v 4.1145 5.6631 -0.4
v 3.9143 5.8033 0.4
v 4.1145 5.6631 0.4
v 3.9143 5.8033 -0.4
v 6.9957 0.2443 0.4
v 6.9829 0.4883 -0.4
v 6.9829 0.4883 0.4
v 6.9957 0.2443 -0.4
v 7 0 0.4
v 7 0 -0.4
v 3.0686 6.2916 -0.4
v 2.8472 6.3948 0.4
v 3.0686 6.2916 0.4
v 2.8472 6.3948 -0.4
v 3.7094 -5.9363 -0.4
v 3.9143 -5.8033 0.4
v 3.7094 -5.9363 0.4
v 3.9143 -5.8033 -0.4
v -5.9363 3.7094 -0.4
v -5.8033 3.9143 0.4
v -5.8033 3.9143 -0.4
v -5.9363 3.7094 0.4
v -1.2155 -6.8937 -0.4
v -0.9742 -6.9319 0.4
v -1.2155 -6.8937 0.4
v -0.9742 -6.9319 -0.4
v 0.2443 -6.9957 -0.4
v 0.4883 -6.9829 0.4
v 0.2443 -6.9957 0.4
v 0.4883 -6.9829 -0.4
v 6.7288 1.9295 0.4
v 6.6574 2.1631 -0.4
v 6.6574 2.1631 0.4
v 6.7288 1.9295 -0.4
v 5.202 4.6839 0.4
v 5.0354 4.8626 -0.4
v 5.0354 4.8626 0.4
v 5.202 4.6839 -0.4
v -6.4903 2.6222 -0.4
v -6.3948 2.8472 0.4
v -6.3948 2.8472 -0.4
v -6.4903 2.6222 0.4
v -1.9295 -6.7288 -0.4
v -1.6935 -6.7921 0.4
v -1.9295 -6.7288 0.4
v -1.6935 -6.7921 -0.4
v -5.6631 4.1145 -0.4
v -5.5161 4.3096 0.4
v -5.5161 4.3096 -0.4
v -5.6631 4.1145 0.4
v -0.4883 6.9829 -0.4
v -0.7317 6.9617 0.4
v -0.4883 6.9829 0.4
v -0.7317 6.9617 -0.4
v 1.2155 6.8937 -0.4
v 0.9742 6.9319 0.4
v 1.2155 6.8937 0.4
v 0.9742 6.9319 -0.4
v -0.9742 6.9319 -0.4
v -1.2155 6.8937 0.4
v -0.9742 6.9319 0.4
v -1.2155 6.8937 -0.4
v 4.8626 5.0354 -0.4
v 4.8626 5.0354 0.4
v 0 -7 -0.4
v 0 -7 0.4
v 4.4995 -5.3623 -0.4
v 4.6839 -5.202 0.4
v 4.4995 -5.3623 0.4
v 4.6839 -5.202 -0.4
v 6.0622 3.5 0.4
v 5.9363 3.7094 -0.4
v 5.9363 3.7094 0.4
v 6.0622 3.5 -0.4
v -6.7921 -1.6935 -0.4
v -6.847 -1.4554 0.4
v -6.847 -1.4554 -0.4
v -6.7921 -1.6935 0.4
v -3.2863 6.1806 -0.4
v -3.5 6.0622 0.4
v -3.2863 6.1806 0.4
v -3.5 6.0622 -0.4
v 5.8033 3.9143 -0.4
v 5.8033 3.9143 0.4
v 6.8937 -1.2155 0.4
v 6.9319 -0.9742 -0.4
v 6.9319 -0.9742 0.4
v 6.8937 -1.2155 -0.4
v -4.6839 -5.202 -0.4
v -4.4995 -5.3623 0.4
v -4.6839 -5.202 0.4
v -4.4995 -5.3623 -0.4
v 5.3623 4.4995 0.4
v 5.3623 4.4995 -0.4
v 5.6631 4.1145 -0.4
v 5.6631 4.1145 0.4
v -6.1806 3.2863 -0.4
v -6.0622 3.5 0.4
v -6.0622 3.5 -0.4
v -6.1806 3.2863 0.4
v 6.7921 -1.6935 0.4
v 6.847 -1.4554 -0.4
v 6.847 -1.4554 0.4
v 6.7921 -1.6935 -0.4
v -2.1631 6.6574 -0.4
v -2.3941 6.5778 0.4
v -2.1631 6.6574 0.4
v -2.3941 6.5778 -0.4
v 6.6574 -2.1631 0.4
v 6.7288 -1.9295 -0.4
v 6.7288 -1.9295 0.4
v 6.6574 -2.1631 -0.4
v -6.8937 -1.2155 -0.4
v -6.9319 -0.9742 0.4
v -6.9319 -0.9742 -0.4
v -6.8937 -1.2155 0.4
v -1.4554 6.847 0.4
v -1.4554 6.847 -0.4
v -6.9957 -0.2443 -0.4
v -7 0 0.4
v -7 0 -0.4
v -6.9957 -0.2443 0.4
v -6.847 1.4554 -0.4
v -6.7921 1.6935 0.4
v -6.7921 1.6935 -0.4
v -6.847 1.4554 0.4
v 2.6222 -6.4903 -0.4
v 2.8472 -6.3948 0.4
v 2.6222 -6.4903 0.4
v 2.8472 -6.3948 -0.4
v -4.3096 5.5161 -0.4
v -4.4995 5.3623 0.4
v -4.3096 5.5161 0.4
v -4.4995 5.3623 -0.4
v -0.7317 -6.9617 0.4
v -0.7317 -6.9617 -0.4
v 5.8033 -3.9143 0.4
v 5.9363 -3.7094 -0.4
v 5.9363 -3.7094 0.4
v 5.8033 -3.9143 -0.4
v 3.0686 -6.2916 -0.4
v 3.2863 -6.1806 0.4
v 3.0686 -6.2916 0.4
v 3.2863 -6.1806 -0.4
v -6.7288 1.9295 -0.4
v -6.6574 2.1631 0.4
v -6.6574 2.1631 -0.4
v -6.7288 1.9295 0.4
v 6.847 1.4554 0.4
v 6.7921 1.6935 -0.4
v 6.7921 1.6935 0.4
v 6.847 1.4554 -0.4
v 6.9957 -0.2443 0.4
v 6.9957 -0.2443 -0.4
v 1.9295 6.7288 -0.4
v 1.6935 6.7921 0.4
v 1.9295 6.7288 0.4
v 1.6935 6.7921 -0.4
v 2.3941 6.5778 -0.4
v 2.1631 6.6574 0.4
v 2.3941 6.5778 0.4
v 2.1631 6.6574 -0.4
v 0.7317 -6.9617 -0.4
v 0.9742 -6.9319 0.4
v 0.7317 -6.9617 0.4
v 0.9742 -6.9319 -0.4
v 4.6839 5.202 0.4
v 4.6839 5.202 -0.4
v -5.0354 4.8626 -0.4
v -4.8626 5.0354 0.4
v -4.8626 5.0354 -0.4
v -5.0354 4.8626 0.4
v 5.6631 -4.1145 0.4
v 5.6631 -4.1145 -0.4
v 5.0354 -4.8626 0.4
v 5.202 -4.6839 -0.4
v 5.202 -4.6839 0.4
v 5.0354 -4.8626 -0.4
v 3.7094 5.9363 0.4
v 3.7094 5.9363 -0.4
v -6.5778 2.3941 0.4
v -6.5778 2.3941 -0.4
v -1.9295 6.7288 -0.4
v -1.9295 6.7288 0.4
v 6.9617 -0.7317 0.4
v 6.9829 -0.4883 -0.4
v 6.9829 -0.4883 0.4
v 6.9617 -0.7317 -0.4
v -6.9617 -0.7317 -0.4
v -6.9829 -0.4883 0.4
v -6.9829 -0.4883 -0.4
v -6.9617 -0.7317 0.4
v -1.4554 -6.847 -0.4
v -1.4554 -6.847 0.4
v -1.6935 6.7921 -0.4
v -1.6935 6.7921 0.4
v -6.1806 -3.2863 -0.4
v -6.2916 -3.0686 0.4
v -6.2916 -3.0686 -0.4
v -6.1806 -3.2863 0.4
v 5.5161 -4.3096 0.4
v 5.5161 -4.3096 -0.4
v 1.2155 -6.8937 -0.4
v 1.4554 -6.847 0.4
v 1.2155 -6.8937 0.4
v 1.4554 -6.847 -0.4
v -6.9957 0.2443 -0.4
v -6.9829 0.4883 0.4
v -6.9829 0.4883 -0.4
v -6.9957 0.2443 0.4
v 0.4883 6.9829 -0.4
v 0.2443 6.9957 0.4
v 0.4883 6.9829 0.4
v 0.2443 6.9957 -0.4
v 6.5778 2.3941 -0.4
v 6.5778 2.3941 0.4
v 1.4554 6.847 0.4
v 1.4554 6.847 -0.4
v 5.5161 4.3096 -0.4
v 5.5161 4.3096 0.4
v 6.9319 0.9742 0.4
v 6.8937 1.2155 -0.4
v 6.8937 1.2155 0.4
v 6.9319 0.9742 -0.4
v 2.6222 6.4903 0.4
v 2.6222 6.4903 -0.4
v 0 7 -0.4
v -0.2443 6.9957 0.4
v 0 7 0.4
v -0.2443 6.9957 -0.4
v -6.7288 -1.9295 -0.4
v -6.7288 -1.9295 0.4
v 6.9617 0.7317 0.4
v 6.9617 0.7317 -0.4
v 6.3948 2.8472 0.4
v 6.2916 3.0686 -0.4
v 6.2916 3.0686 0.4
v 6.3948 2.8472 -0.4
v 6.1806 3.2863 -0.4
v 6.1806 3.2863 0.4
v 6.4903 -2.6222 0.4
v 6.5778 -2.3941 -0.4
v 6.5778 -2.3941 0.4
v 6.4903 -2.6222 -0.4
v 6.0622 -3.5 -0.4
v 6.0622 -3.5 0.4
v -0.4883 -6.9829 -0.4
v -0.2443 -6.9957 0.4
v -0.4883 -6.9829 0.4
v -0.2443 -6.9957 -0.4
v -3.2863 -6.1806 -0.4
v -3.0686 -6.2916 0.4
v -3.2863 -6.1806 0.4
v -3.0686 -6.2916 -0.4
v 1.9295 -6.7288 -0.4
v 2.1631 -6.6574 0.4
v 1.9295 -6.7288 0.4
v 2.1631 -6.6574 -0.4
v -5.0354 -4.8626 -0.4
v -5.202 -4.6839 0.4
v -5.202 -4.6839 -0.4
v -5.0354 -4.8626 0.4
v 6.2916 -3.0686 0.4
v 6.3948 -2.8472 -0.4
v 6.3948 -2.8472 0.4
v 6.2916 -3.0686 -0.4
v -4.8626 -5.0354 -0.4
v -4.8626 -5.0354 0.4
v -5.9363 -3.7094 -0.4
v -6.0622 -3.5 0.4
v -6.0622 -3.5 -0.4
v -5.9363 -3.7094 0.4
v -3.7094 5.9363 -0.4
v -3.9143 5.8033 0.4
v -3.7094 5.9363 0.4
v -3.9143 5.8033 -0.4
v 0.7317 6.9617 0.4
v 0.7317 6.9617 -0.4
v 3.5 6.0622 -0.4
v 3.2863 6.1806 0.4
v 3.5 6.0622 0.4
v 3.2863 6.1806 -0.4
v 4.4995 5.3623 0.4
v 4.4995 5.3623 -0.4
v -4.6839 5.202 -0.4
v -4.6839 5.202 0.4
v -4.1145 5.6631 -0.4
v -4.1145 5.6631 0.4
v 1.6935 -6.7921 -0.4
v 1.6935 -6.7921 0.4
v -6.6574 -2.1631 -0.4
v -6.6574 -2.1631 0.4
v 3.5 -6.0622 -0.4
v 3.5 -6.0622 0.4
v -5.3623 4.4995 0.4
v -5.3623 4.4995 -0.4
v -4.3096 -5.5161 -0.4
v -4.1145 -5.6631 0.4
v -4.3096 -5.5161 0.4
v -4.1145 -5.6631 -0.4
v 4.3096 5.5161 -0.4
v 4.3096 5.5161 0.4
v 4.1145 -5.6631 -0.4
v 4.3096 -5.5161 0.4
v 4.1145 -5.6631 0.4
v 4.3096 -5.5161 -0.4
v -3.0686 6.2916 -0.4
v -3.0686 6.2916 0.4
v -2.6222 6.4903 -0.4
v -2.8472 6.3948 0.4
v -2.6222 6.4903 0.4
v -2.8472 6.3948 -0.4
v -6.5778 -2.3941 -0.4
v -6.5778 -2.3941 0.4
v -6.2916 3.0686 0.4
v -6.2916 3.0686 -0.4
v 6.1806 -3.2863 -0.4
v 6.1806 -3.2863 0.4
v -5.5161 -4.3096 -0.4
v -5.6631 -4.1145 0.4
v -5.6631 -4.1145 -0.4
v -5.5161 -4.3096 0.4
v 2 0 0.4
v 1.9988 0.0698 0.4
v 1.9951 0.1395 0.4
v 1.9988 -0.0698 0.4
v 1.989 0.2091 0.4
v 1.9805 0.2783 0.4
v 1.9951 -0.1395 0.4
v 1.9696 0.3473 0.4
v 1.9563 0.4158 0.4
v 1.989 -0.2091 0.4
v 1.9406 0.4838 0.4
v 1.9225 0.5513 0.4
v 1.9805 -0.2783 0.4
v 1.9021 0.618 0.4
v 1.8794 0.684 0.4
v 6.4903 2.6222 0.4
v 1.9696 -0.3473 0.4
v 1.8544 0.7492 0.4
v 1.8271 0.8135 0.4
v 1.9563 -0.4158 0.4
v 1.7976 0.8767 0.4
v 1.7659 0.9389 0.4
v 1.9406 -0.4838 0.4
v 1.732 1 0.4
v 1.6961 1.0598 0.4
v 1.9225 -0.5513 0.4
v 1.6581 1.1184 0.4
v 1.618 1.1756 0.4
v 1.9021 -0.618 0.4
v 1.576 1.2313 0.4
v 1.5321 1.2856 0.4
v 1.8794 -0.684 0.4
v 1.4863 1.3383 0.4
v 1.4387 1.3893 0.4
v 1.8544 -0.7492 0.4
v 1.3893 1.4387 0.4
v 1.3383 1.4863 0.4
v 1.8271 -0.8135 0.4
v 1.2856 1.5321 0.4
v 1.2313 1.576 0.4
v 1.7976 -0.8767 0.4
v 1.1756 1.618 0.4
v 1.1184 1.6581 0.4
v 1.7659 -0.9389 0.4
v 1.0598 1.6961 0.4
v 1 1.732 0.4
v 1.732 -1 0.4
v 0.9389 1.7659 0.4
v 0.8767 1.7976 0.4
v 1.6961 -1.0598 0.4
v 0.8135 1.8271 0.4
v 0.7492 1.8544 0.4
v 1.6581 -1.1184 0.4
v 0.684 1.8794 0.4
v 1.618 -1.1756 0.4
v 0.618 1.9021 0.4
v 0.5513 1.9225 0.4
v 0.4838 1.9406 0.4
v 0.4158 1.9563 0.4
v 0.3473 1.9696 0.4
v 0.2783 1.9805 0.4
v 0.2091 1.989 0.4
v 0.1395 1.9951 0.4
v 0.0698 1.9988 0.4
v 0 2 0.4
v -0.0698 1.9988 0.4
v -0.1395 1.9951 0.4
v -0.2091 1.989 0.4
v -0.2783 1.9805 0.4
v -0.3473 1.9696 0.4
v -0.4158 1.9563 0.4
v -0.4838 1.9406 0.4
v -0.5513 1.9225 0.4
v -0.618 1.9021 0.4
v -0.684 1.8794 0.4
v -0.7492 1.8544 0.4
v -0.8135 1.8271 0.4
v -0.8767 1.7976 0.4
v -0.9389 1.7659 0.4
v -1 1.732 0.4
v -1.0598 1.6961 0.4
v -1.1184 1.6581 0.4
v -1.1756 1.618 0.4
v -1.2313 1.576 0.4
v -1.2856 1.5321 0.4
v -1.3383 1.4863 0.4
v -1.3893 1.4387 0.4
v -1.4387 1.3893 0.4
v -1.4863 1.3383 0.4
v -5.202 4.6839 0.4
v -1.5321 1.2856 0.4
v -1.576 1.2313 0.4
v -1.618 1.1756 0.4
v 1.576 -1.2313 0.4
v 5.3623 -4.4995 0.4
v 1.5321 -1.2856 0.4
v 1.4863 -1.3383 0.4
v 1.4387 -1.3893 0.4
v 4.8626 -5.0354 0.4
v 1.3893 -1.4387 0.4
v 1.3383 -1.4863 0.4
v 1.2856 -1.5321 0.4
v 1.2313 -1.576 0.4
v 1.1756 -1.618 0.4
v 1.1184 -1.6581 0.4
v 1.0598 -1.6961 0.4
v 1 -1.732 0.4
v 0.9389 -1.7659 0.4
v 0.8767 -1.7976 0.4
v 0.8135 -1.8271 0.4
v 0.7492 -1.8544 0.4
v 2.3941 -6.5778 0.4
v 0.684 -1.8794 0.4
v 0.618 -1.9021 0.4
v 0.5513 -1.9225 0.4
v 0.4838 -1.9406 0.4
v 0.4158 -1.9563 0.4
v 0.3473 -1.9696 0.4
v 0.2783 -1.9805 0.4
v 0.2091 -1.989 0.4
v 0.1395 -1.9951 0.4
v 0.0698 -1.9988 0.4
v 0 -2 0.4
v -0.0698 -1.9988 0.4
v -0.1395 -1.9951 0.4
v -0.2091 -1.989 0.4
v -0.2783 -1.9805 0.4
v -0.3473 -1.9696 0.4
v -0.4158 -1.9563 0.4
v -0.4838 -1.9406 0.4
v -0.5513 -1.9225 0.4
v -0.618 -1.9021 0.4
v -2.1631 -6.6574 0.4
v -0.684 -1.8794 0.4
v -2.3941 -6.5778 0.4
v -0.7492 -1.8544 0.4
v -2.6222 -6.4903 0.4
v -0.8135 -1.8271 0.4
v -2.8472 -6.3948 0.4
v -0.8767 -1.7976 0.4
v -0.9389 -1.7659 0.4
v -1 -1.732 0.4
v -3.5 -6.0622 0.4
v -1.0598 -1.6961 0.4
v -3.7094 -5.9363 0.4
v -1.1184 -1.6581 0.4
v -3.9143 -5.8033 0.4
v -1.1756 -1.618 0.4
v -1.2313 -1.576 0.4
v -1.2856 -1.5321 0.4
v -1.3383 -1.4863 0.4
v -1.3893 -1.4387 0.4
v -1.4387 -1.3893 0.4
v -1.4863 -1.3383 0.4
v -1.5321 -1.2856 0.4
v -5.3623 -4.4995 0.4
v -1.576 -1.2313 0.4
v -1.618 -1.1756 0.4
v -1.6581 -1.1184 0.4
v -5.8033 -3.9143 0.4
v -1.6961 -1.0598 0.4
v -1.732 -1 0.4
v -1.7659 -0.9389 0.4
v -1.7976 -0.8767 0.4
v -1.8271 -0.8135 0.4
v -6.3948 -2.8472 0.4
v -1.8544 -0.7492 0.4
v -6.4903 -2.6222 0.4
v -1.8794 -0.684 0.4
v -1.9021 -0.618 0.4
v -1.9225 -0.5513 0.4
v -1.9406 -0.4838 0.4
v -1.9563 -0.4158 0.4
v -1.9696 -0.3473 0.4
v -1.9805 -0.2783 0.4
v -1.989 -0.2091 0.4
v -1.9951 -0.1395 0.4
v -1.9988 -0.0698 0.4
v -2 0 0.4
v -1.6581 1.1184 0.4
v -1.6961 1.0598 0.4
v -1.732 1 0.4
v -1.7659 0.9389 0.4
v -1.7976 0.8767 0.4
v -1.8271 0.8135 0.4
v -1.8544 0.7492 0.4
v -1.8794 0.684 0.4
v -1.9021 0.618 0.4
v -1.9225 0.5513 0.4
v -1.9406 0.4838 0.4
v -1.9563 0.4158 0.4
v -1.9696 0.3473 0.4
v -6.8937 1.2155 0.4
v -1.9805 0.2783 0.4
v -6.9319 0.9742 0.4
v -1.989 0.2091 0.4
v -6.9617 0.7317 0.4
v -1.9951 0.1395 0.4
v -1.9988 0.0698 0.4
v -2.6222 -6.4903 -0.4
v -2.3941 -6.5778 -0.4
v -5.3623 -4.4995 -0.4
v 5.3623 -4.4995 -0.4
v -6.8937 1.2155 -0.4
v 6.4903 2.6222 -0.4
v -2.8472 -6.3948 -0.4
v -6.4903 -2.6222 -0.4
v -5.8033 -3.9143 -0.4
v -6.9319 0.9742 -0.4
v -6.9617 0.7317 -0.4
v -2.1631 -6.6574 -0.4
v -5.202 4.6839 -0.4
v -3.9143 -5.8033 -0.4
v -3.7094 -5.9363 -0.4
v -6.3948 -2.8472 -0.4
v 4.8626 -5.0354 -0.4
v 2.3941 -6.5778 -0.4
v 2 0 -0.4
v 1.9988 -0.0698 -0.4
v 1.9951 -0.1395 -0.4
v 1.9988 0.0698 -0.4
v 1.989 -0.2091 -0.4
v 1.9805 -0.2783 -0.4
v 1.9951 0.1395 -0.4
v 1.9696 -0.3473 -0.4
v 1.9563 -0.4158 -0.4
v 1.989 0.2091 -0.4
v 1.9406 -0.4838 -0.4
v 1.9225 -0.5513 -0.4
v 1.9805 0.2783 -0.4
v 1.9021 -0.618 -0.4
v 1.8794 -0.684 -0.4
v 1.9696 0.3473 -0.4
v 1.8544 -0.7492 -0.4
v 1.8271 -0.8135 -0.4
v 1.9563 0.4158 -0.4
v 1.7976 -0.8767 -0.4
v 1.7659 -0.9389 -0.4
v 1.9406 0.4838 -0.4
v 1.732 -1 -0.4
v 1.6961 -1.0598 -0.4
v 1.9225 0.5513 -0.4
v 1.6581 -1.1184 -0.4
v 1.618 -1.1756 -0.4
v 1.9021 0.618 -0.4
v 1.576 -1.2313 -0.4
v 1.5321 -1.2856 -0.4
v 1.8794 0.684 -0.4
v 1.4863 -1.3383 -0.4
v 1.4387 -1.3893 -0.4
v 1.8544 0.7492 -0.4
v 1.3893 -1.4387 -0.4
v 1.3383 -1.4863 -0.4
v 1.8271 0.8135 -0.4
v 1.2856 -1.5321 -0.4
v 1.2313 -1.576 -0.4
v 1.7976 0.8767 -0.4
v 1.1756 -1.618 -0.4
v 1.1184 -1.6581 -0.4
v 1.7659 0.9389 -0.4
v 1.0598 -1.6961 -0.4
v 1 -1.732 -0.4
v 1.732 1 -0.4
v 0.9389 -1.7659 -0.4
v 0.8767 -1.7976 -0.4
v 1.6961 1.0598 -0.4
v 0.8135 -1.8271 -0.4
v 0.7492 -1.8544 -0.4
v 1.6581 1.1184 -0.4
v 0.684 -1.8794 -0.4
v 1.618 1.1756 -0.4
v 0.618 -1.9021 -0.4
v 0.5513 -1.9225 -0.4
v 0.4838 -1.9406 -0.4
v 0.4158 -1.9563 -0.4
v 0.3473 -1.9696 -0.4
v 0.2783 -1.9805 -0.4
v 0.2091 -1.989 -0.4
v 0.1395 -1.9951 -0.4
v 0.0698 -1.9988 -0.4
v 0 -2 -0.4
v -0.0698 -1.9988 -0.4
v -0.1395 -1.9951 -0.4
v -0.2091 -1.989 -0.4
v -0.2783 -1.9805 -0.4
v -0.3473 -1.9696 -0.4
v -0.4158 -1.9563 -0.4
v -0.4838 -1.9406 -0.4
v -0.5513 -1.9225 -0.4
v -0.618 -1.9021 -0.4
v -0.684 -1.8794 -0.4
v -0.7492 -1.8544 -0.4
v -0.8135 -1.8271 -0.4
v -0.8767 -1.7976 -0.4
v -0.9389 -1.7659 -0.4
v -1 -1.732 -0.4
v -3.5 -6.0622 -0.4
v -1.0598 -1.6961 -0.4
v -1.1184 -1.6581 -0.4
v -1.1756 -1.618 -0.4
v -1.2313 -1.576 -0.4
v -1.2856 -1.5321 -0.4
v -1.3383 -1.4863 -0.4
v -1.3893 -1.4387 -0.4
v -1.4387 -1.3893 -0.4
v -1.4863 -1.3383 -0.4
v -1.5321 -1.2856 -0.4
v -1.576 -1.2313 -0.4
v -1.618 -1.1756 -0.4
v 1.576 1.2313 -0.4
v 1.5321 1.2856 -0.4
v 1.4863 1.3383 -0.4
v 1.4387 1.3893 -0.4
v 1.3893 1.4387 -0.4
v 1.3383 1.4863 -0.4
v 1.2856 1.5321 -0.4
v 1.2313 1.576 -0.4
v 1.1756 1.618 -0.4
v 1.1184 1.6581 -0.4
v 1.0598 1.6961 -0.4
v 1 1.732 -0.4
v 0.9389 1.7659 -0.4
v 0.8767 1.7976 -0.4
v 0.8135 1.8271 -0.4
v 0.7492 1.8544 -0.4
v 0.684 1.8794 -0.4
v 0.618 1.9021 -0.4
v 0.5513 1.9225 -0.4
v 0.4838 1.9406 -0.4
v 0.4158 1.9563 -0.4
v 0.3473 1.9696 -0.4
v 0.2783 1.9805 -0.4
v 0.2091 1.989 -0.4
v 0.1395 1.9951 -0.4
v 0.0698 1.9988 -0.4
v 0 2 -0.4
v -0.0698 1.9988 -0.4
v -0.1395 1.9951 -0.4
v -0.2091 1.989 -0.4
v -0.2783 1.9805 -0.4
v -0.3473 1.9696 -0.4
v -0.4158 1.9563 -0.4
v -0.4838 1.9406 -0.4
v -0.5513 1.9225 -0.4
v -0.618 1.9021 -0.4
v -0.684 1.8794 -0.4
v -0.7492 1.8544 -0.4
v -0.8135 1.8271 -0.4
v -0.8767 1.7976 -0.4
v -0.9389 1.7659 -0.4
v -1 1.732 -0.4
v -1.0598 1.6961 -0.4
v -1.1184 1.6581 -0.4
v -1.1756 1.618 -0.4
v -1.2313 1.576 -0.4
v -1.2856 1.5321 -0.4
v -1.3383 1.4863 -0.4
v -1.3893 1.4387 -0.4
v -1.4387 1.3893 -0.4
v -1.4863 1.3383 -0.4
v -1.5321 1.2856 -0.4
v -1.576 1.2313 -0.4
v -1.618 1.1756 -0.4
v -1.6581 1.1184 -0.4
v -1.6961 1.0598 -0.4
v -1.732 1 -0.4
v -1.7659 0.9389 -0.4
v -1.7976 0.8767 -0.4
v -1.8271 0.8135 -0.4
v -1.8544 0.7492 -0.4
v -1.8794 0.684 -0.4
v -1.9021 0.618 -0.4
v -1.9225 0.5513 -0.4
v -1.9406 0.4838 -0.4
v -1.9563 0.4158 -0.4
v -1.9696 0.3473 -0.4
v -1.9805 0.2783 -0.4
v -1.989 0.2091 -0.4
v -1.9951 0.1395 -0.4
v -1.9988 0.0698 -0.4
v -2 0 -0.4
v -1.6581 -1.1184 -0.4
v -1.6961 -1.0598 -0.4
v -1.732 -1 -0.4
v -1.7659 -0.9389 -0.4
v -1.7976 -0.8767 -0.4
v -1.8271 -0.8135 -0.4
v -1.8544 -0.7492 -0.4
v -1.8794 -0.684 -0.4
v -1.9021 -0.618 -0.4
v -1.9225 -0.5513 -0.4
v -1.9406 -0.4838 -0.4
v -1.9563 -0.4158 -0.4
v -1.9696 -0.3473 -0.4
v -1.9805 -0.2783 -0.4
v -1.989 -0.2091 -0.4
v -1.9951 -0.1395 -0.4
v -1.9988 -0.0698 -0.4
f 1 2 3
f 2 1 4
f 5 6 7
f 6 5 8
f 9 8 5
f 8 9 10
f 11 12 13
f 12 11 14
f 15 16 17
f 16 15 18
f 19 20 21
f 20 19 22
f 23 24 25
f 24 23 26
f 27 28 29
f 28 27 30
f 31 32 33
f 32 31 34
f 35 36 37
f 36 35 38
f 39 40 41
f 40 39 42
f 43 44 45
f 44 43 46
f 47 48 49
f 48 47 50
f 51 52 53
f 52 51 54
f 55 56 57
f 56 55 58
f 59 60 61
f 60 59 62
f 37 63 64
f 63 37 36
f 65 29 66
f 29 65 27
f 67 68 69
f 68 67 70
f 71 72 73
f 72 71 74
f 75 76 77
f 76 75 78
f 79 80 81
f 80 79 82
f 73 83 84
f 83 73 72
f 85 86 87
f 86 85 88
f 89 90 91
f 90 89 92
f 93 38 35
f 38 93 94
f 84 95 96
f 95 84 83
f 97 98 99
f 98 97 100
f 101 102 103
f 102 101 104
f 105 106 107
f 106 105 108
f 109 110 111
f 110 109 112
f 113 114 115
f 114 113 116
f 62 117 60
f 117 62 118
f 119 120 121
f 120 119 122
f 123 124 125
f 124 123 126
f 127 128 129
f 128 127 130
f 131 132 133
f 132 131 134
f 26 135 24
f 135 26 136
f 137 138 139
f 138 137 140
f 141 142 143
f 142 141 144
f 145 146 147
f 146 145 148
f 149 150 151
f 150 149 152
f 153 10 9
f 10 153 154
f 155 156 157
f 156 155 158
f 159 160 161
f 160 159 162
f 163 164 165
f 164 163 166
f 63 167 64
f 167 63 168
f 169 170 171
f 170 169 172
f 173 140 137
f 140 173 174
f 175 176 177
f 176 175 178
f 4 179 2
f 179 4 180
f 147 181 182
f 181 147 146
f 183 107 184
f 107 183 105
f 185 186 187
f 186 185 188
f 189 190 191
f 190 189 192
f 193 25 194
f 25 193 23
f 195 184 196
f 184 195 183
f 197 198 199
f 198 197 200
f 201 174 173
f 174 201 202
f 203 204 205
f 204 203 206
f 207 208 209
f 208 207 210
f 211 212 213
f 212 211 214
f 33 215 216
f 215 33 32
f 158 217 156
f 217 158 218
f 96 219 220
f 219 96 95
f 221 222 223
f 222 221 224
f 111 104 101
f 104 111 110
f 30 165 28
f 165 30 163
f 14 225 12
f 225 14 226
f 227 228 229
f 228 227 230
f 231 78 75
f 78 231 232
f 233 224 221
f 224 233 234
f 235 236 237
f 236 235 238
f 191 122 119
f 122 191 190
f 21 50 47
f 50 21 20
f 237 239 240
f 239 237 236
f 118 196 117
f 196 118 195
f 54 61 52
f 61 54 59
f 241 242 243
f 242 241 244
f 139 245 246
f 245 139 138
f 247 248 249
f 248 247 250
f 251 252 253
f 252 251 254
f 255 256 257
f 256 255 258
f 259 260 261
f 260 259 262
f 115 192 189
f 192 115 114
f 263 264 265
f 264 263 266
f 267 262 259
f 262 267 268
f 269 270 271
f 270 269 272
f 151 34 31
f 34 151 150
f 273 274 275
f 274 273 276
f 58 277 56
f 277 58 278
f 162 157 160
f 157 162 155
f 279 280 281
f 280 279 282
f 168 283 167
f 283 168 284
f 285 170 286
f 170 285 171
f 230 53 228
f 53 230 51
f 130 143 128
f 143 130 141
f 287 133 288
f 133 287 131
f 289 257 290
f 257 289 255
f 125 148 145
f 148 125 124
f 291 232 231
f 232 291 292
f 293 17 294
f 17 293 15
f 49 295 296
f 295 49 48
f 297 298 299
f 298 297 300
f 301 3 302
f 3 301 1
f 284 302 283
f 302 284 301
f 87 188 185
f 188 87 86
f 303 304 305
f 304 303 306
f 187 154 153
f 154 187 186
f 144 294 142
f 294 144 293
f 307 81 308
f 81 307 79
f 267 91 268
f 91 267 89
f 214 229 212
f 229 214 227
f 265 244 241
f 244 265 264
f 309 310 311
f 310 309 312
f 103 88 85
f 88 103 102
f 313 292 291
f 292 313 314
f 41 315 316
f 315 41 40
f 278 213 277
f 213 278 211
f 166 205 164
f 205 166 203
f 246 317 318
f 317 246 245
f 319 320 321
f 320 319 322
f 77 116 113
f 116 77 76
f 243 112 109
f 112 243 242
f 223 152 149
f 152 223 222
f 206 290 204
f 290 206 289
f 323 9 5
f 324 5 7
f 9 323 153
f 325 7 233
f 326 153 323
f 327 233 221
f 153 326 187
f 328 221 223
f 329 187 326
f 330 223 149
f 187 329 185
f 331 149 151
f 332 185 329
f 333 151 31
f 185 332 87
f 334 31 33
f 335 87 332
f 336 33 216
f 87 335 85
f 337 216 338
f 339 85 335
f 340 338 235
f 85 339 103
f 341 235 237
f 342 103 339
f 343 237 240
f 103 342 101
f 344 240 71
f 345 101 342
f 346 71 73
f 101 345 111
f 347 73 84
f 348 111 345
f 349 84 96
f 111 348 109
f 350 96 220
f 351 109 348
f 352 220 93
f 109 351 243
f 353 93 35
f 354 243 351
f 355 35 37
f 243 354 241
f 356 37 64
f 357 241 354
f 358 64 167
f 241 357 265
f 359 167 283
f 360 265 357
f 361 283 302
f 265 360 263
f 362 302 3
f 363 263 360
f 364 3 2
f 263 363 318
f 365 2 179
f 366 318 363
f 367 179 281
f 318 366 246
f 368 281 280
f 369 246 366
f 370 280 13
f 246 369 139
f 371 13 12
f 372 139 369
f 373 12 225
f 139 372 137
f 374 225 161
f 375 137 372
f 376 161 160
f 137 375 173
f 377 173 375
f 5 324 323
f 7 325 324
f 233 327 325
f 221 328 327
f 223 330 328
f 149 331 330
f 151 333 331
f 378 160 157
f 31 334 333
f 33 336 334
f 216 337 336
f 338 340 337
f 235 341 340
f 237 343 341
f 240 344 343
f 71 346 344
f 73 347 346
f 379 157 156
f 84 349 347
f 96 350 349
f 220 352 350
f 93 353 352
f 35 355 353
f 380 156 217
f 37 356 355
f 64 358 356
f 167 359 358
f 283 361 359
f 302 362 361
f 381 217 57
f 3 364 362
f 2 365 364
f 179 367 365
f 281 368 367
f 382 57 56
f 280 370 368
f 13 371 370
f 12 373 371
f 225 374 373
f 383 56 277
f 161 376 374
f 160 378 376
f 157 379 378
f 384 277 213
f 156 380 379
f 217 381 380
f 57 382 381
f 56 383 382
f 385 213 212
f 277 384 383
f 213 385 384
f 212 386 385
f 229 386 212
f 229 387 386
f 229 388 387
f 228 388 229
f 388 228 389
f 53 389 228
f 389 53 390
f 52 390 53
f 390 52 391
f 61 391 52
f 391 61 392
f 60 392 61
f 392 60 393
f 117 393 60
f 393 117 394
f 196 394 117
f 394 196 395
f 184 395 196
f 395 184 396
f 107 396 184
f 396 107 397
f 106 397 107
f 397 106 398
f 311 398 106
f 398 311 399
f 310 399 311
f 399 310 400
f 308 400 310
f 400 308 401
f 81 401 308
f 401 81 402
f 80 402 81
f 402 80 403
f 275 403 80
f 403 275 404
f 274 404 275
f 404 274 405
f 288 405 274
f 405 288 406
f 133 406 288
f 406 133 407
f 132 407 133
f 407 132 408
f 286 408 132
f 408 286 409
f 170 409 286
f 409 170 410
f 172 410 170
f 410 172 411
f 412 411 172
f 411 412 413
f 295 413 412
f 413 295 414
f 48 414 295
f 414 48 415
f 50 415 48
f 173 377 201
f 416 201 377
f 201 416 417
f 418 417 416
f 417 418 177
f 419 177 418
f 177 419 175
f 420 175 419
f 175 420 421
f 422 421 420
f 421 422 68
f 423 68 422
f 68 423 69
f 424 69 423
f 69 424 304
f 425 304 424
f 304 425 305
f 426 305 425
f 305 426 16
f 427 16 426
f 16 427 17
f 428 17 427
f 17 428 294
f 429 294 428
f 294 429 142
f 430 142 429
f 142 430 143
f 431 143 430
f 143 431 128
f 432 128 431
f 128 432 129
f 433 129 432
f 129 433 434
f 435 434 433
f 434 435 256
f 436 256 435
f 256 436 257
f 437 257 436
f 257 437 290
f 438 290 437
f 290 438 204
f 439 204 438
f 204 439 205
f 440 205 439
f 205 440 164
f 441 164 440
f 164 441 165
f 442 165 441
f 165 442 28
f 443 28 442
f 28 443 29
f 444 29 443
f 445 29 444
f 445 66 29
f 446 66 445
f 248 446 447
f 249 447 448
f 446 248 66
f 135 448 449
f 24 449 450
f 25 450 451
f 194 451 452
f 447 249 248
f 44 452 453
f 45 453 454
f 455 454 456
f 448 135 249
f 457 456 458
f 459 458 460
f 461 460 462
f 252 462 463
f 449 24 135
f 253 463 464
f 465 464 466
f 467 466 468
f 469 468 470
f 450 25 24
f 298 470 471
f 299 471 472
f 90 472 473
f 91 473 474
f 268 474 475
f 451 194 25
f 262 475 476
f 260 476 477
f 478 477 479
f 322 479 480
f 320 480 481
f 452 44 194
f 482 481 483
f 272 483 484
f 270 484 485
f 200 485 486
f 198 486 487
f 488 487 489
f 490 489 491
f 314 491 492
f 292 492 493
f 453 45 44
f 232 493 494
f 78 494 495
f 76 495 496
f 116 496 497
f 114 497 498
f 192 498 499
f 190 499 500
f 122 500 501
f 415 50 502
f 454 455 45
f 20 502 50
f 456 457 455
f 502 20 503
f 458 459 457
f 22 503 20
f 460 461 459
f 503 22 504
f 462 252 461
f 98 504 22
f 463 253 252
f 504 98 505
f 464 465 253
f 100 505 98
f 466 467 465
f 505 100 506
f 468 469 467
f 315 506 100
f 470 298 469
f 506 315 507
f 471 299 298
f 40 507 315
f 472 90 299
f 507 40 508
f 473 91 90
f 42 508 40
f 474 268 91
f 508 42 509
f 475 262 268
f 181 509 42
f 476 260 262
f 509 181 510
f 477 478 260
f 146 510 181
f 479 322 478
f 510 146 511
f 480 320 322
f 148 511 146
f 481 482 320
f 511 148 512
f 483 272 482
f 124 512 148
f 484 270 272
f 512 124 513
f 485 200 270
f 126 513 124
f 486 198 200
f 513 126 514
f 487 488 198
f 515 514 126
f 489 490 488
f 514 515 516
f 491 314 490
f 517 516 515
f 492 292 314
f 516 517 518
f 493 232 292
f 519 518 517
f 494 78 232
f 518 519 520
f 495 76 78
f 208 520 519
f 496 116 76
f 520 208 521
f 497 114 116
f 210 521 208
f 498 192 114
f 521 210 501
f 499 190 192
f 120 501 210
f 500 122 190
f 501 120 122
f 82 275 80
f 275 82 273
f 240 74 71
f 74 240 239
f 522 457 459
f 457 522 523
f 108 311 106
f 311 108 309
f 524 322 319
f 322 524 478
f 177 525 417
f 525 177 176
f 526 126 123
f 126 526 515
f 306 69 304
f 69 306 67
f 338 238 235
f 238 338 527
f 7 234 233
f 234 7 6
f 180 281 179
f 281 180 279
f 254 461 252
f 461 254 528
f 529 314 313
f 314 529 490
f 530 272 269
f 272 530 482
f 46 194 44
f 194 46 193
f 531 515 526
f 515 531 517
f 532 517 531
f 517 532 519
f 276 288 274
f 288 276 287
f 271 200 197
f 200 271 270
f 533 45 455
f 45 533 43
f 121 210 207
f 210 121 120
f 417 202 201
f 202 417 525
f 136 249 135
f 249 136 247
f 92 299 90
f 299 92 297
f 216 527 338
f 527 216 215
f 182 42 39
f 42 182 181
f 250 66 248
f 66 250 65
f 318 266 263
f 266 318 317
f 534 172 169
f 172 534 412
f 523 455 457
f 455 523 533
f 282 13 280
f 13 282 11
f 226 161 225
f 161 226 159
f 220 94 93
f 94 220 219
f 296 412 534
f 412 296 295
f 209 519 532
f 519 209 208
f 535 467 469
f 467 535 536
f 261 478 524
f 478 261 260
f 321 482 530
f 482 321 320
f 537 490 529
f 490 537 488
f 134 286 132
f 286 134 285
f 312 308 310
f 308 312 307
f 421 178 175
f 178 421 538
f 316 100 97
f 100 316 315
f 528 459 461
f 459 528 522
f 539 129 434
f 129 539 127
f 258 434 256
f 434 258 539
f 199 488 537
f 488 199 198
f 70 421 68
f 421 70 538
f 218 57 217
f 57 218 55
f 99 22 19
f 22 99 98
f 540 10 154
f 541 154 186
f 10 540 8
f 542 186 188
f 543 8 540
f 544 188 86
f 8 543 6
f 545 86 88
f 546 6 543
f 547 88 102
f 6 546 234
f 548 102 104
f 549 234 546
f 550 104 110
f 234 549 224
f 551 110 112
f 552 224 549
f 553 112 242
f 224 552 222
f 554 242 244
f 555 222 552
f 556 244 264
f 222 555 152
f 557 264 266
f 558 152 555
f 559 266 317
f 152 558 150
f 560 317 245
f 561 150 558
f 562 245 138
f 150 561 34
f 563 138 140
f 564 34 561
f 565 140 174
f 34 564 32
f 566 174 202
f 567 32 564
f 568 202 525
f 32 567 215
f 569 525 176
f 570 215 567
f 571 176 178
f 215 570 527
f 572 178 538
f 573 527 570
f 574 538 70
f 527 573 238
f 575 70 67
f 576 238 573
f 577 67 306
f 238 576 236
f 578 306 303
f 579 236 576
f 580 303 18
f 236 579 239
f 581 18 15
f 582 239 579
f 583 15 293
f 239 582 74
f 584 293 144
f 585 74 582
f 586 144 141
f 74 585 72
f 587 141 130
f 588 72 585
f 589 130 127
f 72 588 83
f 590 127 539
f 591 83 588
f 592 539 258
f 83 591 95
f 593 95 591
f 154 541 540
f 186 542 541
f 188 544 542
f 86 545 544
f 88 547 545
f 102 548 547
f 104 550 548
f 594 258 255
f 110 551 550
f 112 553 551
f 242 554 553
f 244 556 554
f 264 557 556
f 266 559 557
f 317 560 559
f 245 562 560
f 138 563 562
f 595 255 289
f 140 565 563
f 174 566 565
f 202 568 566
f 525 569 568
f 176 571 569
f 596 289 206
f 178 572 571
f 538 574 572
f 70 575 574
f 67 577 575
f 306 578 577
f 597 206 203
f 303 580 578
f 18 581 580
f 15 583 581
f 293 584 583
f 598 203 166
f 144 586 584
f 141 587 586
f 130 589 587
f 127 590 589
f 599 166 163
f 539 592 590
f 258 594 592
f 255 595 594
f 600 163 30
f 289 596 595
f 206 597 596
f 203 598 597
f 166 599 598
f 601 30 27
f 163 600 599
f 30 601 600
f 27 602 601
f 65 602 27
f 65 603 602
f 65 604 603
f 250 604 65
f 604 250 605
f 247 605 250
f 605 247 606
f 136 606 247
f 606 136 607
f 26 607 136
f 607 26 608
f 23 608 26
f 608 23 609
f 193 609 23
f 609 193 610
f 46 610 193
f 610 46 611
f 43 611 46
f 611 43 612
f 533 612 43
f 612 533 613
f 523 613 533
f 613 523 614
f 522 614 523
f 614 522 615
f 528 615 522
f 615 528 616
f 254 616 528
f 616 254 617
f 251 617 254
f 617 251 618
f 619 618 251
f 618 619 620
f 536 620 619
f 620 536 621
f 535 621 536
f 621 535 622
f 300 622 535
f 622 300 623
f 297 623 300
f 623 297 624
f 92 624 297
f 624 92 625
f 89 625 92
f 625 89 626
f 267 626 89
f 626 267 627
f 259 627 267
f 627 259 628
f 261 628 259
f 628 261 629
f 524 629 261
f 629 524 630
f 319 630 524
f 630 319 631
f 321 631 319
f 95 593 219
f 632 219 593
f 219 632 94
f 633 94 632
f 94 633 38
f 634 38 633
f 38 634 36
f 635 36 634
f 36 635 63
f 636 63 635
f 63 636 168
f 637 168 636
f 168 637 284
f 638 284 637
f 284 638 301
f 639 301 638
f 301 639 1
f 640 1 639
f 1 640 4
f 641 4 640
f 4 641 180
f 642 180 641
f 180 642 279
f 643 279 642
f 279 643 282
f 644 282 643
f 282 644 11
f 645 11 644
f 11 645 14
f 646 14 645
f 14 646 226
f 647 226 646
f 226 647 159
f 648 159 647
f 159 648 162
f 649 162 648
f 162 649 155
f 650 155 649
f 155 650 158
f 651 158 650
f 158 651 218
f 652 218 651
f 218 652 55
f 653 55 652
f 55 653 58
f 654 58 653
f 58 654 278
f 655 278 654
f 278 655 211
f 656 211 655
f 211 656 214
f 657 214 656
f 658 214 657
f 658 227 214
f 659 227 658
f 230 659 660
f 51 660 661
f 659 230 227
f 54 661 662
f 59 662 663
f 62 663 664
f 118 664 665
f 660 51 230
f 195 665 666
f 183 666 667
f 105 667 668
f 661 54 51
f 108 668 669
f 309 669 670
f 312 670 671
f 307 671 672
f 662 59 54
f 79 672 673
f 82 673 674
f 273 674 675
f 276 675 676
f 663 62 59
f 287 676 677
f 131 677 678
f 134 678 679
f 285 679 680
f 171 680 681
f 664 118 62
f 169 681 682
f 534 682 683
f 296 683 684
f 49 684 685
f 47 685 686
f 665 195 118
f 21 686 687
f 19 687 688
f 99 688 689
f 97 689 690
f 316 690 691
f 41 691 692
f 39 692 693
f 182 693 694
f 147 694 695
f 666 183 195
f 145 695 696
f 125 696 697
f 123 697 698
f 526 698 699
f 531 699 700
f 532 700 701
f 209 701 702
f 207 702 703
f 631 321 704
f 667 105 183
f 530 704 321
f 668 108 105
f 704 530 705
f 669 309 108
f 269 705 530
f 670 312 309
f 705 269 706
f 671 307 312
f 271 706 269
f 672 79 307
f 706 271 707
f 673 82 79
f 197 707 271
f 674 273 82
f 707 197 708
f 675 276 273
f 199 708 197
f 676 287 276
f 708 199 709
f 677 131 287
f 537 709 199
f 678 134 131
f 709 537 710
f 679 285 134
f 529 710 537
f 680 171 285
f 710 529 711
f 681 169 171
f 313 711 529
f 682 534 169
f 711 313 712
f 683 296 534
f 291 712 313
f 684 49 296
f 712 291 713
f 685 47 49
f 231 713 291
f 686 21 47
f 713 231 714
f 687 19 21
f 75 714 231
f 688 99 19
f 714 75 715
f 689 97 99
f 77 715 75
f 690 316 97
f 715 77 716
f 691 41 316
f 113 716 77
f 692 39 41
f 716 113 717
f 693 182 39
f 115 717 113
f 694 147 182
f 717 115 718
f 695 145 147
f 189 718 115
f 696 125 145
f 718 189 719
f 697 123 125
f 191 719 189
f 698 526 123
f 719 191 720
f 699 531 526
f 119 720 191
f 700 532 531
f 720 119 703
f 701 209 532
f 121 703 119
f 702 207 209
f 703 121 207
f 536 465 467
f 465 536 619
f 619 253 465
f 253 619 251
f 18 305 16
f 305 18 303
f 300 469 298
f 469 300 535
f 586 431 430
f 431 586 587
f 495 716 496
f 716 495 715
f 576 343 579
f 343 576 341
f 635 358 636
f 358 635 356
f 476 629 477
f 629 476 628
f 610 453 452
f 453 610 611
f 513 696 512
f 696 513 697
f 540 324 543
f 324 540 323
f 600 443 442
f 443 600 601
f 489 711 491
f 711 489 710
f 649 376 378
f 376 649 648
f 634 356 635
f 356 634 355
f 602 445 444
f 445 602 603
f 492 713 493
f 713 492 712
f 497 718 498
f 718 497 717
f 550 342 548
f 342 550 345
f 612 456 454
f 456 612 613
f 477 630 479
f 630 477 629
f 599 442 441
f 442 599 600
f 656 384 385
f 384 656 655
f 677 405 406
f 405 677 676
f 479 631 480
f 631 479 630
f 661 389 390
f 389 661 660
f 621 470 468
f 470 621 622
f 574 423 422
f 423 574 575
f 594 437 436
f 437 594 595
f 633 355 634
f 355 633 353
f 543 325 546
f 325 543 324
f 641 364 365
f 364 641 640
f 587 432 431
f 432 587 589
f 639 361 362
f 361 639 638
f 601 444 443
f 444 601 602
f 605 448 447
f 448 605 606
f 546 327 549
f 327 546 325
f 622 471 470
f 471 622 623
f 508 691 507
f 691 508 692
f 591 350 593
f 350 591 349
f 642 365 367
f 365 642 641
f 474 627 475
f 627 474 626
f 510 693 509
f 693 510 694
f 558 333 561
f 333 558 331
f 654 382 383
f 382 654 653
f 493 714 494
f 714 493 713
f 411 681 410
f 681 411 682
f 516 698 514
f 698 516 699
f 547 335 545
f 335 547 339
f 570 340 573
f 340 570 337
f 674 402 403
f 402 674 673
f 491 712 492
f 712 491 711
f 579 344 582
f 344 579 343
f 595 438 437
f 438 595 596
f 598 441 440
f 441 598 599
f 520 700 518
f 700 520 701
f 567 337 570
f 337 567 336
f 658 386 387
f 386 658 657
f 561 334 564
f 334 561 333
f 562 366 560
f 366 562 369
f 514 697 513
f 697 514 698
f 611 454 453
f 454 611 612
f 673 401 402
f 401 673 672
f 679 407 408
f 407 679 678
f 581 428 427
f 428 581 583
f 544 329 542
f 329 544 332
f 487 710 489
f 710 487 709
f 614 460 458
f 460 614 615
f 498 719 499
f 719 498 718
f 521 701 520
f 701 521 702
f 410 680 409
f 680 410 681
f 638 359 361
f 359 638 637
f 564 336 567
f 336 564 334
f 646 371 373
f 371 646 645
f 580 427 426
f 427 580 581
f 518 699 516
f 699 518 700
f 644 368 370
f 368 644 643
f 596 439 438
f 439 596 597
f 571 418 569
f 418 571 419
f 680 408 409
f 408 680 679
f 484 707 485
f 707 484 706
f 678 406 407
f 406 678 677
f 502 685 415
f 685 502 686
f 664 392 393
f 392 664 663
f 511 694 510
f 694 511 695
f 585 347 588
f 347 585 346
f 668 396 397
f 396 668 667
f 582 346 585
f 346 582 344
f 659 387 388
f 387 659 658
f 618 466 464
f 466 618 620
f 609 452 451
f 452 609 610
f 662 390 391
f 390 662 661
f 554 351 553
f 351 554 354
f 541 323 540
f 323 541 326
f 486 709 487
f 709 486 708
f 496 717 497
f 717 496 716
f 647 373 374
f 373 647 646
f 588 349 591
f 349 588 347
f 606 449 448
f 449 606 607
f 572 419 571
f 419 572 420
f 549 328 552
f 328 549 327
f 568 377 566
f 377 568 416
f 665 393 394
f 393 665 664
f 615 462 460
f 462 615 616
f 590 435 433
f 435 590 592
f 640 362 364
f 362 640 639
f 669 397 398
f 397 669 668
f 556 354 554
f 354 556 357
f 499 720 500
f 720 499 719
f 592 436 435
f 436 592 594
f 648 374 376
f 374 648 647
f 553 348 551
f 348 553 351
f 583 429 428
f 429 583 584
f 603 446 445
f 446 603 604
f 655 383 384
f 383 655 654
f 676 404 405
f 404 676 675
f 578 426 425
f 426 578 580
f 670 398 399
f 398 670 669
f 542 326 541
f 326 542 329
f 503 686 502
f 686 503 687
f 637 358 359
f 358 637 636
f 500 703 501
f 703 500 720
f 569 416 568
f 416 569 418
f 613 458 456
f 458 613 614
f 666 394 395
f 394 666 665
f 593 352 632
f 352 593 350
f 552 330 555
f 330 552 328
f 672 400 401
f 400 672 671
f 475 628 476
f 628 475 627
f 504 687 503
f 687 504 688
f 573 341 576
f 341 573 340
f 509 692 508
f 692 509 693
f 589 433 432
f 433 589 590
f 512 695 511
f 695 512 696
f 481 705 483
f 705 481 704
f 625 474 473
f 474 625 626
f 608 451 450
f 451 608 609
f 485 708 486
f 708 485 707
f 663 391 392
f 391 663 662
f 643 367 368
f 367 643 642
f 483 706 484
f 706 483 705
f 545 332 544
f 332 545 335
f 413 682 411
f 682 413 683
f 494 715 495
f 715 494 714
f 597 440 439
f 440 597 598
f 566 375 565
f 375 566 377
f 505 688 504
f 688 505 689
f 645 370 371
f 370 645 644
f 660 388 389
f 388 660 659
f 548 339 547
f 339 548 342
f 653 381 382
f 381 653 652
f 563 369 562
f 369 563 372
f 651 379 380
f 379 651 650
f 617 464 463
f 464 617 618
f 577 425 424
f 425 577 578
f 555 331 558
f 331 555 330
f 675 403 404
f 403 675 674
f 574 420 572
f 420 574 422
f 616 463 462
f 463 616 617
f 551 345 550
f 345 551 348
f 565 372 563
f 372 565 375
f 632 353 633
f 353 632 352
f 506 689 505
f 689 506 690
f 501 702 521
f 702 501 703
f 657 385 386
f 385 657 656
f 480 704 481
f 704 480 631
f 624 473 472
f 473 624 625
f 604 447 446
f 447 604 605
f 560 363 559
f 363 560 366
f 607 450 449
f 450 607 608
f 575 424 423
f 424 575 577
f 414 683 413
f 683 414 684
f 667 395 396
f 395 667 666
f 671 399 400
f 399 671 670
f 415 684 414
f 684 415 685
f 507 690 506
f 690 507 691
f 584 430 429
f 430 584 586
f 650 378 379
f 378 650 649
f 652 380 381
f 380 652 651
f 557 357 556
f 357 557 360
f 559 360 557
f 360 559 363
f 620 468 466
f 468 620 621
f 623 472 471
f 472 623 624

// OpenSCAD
$fn = 180;

module penny_washer(id=4.0, od=14.0, t=0.8) {
    eps = 0.02; // small extra to guarantee a clean through-hole cut

    difference() {
        cylinder(h=t, d=od, center=true);
        cylinder(h=t + 2*eps, d=id, center=true);
    }
}

penny_washer();
